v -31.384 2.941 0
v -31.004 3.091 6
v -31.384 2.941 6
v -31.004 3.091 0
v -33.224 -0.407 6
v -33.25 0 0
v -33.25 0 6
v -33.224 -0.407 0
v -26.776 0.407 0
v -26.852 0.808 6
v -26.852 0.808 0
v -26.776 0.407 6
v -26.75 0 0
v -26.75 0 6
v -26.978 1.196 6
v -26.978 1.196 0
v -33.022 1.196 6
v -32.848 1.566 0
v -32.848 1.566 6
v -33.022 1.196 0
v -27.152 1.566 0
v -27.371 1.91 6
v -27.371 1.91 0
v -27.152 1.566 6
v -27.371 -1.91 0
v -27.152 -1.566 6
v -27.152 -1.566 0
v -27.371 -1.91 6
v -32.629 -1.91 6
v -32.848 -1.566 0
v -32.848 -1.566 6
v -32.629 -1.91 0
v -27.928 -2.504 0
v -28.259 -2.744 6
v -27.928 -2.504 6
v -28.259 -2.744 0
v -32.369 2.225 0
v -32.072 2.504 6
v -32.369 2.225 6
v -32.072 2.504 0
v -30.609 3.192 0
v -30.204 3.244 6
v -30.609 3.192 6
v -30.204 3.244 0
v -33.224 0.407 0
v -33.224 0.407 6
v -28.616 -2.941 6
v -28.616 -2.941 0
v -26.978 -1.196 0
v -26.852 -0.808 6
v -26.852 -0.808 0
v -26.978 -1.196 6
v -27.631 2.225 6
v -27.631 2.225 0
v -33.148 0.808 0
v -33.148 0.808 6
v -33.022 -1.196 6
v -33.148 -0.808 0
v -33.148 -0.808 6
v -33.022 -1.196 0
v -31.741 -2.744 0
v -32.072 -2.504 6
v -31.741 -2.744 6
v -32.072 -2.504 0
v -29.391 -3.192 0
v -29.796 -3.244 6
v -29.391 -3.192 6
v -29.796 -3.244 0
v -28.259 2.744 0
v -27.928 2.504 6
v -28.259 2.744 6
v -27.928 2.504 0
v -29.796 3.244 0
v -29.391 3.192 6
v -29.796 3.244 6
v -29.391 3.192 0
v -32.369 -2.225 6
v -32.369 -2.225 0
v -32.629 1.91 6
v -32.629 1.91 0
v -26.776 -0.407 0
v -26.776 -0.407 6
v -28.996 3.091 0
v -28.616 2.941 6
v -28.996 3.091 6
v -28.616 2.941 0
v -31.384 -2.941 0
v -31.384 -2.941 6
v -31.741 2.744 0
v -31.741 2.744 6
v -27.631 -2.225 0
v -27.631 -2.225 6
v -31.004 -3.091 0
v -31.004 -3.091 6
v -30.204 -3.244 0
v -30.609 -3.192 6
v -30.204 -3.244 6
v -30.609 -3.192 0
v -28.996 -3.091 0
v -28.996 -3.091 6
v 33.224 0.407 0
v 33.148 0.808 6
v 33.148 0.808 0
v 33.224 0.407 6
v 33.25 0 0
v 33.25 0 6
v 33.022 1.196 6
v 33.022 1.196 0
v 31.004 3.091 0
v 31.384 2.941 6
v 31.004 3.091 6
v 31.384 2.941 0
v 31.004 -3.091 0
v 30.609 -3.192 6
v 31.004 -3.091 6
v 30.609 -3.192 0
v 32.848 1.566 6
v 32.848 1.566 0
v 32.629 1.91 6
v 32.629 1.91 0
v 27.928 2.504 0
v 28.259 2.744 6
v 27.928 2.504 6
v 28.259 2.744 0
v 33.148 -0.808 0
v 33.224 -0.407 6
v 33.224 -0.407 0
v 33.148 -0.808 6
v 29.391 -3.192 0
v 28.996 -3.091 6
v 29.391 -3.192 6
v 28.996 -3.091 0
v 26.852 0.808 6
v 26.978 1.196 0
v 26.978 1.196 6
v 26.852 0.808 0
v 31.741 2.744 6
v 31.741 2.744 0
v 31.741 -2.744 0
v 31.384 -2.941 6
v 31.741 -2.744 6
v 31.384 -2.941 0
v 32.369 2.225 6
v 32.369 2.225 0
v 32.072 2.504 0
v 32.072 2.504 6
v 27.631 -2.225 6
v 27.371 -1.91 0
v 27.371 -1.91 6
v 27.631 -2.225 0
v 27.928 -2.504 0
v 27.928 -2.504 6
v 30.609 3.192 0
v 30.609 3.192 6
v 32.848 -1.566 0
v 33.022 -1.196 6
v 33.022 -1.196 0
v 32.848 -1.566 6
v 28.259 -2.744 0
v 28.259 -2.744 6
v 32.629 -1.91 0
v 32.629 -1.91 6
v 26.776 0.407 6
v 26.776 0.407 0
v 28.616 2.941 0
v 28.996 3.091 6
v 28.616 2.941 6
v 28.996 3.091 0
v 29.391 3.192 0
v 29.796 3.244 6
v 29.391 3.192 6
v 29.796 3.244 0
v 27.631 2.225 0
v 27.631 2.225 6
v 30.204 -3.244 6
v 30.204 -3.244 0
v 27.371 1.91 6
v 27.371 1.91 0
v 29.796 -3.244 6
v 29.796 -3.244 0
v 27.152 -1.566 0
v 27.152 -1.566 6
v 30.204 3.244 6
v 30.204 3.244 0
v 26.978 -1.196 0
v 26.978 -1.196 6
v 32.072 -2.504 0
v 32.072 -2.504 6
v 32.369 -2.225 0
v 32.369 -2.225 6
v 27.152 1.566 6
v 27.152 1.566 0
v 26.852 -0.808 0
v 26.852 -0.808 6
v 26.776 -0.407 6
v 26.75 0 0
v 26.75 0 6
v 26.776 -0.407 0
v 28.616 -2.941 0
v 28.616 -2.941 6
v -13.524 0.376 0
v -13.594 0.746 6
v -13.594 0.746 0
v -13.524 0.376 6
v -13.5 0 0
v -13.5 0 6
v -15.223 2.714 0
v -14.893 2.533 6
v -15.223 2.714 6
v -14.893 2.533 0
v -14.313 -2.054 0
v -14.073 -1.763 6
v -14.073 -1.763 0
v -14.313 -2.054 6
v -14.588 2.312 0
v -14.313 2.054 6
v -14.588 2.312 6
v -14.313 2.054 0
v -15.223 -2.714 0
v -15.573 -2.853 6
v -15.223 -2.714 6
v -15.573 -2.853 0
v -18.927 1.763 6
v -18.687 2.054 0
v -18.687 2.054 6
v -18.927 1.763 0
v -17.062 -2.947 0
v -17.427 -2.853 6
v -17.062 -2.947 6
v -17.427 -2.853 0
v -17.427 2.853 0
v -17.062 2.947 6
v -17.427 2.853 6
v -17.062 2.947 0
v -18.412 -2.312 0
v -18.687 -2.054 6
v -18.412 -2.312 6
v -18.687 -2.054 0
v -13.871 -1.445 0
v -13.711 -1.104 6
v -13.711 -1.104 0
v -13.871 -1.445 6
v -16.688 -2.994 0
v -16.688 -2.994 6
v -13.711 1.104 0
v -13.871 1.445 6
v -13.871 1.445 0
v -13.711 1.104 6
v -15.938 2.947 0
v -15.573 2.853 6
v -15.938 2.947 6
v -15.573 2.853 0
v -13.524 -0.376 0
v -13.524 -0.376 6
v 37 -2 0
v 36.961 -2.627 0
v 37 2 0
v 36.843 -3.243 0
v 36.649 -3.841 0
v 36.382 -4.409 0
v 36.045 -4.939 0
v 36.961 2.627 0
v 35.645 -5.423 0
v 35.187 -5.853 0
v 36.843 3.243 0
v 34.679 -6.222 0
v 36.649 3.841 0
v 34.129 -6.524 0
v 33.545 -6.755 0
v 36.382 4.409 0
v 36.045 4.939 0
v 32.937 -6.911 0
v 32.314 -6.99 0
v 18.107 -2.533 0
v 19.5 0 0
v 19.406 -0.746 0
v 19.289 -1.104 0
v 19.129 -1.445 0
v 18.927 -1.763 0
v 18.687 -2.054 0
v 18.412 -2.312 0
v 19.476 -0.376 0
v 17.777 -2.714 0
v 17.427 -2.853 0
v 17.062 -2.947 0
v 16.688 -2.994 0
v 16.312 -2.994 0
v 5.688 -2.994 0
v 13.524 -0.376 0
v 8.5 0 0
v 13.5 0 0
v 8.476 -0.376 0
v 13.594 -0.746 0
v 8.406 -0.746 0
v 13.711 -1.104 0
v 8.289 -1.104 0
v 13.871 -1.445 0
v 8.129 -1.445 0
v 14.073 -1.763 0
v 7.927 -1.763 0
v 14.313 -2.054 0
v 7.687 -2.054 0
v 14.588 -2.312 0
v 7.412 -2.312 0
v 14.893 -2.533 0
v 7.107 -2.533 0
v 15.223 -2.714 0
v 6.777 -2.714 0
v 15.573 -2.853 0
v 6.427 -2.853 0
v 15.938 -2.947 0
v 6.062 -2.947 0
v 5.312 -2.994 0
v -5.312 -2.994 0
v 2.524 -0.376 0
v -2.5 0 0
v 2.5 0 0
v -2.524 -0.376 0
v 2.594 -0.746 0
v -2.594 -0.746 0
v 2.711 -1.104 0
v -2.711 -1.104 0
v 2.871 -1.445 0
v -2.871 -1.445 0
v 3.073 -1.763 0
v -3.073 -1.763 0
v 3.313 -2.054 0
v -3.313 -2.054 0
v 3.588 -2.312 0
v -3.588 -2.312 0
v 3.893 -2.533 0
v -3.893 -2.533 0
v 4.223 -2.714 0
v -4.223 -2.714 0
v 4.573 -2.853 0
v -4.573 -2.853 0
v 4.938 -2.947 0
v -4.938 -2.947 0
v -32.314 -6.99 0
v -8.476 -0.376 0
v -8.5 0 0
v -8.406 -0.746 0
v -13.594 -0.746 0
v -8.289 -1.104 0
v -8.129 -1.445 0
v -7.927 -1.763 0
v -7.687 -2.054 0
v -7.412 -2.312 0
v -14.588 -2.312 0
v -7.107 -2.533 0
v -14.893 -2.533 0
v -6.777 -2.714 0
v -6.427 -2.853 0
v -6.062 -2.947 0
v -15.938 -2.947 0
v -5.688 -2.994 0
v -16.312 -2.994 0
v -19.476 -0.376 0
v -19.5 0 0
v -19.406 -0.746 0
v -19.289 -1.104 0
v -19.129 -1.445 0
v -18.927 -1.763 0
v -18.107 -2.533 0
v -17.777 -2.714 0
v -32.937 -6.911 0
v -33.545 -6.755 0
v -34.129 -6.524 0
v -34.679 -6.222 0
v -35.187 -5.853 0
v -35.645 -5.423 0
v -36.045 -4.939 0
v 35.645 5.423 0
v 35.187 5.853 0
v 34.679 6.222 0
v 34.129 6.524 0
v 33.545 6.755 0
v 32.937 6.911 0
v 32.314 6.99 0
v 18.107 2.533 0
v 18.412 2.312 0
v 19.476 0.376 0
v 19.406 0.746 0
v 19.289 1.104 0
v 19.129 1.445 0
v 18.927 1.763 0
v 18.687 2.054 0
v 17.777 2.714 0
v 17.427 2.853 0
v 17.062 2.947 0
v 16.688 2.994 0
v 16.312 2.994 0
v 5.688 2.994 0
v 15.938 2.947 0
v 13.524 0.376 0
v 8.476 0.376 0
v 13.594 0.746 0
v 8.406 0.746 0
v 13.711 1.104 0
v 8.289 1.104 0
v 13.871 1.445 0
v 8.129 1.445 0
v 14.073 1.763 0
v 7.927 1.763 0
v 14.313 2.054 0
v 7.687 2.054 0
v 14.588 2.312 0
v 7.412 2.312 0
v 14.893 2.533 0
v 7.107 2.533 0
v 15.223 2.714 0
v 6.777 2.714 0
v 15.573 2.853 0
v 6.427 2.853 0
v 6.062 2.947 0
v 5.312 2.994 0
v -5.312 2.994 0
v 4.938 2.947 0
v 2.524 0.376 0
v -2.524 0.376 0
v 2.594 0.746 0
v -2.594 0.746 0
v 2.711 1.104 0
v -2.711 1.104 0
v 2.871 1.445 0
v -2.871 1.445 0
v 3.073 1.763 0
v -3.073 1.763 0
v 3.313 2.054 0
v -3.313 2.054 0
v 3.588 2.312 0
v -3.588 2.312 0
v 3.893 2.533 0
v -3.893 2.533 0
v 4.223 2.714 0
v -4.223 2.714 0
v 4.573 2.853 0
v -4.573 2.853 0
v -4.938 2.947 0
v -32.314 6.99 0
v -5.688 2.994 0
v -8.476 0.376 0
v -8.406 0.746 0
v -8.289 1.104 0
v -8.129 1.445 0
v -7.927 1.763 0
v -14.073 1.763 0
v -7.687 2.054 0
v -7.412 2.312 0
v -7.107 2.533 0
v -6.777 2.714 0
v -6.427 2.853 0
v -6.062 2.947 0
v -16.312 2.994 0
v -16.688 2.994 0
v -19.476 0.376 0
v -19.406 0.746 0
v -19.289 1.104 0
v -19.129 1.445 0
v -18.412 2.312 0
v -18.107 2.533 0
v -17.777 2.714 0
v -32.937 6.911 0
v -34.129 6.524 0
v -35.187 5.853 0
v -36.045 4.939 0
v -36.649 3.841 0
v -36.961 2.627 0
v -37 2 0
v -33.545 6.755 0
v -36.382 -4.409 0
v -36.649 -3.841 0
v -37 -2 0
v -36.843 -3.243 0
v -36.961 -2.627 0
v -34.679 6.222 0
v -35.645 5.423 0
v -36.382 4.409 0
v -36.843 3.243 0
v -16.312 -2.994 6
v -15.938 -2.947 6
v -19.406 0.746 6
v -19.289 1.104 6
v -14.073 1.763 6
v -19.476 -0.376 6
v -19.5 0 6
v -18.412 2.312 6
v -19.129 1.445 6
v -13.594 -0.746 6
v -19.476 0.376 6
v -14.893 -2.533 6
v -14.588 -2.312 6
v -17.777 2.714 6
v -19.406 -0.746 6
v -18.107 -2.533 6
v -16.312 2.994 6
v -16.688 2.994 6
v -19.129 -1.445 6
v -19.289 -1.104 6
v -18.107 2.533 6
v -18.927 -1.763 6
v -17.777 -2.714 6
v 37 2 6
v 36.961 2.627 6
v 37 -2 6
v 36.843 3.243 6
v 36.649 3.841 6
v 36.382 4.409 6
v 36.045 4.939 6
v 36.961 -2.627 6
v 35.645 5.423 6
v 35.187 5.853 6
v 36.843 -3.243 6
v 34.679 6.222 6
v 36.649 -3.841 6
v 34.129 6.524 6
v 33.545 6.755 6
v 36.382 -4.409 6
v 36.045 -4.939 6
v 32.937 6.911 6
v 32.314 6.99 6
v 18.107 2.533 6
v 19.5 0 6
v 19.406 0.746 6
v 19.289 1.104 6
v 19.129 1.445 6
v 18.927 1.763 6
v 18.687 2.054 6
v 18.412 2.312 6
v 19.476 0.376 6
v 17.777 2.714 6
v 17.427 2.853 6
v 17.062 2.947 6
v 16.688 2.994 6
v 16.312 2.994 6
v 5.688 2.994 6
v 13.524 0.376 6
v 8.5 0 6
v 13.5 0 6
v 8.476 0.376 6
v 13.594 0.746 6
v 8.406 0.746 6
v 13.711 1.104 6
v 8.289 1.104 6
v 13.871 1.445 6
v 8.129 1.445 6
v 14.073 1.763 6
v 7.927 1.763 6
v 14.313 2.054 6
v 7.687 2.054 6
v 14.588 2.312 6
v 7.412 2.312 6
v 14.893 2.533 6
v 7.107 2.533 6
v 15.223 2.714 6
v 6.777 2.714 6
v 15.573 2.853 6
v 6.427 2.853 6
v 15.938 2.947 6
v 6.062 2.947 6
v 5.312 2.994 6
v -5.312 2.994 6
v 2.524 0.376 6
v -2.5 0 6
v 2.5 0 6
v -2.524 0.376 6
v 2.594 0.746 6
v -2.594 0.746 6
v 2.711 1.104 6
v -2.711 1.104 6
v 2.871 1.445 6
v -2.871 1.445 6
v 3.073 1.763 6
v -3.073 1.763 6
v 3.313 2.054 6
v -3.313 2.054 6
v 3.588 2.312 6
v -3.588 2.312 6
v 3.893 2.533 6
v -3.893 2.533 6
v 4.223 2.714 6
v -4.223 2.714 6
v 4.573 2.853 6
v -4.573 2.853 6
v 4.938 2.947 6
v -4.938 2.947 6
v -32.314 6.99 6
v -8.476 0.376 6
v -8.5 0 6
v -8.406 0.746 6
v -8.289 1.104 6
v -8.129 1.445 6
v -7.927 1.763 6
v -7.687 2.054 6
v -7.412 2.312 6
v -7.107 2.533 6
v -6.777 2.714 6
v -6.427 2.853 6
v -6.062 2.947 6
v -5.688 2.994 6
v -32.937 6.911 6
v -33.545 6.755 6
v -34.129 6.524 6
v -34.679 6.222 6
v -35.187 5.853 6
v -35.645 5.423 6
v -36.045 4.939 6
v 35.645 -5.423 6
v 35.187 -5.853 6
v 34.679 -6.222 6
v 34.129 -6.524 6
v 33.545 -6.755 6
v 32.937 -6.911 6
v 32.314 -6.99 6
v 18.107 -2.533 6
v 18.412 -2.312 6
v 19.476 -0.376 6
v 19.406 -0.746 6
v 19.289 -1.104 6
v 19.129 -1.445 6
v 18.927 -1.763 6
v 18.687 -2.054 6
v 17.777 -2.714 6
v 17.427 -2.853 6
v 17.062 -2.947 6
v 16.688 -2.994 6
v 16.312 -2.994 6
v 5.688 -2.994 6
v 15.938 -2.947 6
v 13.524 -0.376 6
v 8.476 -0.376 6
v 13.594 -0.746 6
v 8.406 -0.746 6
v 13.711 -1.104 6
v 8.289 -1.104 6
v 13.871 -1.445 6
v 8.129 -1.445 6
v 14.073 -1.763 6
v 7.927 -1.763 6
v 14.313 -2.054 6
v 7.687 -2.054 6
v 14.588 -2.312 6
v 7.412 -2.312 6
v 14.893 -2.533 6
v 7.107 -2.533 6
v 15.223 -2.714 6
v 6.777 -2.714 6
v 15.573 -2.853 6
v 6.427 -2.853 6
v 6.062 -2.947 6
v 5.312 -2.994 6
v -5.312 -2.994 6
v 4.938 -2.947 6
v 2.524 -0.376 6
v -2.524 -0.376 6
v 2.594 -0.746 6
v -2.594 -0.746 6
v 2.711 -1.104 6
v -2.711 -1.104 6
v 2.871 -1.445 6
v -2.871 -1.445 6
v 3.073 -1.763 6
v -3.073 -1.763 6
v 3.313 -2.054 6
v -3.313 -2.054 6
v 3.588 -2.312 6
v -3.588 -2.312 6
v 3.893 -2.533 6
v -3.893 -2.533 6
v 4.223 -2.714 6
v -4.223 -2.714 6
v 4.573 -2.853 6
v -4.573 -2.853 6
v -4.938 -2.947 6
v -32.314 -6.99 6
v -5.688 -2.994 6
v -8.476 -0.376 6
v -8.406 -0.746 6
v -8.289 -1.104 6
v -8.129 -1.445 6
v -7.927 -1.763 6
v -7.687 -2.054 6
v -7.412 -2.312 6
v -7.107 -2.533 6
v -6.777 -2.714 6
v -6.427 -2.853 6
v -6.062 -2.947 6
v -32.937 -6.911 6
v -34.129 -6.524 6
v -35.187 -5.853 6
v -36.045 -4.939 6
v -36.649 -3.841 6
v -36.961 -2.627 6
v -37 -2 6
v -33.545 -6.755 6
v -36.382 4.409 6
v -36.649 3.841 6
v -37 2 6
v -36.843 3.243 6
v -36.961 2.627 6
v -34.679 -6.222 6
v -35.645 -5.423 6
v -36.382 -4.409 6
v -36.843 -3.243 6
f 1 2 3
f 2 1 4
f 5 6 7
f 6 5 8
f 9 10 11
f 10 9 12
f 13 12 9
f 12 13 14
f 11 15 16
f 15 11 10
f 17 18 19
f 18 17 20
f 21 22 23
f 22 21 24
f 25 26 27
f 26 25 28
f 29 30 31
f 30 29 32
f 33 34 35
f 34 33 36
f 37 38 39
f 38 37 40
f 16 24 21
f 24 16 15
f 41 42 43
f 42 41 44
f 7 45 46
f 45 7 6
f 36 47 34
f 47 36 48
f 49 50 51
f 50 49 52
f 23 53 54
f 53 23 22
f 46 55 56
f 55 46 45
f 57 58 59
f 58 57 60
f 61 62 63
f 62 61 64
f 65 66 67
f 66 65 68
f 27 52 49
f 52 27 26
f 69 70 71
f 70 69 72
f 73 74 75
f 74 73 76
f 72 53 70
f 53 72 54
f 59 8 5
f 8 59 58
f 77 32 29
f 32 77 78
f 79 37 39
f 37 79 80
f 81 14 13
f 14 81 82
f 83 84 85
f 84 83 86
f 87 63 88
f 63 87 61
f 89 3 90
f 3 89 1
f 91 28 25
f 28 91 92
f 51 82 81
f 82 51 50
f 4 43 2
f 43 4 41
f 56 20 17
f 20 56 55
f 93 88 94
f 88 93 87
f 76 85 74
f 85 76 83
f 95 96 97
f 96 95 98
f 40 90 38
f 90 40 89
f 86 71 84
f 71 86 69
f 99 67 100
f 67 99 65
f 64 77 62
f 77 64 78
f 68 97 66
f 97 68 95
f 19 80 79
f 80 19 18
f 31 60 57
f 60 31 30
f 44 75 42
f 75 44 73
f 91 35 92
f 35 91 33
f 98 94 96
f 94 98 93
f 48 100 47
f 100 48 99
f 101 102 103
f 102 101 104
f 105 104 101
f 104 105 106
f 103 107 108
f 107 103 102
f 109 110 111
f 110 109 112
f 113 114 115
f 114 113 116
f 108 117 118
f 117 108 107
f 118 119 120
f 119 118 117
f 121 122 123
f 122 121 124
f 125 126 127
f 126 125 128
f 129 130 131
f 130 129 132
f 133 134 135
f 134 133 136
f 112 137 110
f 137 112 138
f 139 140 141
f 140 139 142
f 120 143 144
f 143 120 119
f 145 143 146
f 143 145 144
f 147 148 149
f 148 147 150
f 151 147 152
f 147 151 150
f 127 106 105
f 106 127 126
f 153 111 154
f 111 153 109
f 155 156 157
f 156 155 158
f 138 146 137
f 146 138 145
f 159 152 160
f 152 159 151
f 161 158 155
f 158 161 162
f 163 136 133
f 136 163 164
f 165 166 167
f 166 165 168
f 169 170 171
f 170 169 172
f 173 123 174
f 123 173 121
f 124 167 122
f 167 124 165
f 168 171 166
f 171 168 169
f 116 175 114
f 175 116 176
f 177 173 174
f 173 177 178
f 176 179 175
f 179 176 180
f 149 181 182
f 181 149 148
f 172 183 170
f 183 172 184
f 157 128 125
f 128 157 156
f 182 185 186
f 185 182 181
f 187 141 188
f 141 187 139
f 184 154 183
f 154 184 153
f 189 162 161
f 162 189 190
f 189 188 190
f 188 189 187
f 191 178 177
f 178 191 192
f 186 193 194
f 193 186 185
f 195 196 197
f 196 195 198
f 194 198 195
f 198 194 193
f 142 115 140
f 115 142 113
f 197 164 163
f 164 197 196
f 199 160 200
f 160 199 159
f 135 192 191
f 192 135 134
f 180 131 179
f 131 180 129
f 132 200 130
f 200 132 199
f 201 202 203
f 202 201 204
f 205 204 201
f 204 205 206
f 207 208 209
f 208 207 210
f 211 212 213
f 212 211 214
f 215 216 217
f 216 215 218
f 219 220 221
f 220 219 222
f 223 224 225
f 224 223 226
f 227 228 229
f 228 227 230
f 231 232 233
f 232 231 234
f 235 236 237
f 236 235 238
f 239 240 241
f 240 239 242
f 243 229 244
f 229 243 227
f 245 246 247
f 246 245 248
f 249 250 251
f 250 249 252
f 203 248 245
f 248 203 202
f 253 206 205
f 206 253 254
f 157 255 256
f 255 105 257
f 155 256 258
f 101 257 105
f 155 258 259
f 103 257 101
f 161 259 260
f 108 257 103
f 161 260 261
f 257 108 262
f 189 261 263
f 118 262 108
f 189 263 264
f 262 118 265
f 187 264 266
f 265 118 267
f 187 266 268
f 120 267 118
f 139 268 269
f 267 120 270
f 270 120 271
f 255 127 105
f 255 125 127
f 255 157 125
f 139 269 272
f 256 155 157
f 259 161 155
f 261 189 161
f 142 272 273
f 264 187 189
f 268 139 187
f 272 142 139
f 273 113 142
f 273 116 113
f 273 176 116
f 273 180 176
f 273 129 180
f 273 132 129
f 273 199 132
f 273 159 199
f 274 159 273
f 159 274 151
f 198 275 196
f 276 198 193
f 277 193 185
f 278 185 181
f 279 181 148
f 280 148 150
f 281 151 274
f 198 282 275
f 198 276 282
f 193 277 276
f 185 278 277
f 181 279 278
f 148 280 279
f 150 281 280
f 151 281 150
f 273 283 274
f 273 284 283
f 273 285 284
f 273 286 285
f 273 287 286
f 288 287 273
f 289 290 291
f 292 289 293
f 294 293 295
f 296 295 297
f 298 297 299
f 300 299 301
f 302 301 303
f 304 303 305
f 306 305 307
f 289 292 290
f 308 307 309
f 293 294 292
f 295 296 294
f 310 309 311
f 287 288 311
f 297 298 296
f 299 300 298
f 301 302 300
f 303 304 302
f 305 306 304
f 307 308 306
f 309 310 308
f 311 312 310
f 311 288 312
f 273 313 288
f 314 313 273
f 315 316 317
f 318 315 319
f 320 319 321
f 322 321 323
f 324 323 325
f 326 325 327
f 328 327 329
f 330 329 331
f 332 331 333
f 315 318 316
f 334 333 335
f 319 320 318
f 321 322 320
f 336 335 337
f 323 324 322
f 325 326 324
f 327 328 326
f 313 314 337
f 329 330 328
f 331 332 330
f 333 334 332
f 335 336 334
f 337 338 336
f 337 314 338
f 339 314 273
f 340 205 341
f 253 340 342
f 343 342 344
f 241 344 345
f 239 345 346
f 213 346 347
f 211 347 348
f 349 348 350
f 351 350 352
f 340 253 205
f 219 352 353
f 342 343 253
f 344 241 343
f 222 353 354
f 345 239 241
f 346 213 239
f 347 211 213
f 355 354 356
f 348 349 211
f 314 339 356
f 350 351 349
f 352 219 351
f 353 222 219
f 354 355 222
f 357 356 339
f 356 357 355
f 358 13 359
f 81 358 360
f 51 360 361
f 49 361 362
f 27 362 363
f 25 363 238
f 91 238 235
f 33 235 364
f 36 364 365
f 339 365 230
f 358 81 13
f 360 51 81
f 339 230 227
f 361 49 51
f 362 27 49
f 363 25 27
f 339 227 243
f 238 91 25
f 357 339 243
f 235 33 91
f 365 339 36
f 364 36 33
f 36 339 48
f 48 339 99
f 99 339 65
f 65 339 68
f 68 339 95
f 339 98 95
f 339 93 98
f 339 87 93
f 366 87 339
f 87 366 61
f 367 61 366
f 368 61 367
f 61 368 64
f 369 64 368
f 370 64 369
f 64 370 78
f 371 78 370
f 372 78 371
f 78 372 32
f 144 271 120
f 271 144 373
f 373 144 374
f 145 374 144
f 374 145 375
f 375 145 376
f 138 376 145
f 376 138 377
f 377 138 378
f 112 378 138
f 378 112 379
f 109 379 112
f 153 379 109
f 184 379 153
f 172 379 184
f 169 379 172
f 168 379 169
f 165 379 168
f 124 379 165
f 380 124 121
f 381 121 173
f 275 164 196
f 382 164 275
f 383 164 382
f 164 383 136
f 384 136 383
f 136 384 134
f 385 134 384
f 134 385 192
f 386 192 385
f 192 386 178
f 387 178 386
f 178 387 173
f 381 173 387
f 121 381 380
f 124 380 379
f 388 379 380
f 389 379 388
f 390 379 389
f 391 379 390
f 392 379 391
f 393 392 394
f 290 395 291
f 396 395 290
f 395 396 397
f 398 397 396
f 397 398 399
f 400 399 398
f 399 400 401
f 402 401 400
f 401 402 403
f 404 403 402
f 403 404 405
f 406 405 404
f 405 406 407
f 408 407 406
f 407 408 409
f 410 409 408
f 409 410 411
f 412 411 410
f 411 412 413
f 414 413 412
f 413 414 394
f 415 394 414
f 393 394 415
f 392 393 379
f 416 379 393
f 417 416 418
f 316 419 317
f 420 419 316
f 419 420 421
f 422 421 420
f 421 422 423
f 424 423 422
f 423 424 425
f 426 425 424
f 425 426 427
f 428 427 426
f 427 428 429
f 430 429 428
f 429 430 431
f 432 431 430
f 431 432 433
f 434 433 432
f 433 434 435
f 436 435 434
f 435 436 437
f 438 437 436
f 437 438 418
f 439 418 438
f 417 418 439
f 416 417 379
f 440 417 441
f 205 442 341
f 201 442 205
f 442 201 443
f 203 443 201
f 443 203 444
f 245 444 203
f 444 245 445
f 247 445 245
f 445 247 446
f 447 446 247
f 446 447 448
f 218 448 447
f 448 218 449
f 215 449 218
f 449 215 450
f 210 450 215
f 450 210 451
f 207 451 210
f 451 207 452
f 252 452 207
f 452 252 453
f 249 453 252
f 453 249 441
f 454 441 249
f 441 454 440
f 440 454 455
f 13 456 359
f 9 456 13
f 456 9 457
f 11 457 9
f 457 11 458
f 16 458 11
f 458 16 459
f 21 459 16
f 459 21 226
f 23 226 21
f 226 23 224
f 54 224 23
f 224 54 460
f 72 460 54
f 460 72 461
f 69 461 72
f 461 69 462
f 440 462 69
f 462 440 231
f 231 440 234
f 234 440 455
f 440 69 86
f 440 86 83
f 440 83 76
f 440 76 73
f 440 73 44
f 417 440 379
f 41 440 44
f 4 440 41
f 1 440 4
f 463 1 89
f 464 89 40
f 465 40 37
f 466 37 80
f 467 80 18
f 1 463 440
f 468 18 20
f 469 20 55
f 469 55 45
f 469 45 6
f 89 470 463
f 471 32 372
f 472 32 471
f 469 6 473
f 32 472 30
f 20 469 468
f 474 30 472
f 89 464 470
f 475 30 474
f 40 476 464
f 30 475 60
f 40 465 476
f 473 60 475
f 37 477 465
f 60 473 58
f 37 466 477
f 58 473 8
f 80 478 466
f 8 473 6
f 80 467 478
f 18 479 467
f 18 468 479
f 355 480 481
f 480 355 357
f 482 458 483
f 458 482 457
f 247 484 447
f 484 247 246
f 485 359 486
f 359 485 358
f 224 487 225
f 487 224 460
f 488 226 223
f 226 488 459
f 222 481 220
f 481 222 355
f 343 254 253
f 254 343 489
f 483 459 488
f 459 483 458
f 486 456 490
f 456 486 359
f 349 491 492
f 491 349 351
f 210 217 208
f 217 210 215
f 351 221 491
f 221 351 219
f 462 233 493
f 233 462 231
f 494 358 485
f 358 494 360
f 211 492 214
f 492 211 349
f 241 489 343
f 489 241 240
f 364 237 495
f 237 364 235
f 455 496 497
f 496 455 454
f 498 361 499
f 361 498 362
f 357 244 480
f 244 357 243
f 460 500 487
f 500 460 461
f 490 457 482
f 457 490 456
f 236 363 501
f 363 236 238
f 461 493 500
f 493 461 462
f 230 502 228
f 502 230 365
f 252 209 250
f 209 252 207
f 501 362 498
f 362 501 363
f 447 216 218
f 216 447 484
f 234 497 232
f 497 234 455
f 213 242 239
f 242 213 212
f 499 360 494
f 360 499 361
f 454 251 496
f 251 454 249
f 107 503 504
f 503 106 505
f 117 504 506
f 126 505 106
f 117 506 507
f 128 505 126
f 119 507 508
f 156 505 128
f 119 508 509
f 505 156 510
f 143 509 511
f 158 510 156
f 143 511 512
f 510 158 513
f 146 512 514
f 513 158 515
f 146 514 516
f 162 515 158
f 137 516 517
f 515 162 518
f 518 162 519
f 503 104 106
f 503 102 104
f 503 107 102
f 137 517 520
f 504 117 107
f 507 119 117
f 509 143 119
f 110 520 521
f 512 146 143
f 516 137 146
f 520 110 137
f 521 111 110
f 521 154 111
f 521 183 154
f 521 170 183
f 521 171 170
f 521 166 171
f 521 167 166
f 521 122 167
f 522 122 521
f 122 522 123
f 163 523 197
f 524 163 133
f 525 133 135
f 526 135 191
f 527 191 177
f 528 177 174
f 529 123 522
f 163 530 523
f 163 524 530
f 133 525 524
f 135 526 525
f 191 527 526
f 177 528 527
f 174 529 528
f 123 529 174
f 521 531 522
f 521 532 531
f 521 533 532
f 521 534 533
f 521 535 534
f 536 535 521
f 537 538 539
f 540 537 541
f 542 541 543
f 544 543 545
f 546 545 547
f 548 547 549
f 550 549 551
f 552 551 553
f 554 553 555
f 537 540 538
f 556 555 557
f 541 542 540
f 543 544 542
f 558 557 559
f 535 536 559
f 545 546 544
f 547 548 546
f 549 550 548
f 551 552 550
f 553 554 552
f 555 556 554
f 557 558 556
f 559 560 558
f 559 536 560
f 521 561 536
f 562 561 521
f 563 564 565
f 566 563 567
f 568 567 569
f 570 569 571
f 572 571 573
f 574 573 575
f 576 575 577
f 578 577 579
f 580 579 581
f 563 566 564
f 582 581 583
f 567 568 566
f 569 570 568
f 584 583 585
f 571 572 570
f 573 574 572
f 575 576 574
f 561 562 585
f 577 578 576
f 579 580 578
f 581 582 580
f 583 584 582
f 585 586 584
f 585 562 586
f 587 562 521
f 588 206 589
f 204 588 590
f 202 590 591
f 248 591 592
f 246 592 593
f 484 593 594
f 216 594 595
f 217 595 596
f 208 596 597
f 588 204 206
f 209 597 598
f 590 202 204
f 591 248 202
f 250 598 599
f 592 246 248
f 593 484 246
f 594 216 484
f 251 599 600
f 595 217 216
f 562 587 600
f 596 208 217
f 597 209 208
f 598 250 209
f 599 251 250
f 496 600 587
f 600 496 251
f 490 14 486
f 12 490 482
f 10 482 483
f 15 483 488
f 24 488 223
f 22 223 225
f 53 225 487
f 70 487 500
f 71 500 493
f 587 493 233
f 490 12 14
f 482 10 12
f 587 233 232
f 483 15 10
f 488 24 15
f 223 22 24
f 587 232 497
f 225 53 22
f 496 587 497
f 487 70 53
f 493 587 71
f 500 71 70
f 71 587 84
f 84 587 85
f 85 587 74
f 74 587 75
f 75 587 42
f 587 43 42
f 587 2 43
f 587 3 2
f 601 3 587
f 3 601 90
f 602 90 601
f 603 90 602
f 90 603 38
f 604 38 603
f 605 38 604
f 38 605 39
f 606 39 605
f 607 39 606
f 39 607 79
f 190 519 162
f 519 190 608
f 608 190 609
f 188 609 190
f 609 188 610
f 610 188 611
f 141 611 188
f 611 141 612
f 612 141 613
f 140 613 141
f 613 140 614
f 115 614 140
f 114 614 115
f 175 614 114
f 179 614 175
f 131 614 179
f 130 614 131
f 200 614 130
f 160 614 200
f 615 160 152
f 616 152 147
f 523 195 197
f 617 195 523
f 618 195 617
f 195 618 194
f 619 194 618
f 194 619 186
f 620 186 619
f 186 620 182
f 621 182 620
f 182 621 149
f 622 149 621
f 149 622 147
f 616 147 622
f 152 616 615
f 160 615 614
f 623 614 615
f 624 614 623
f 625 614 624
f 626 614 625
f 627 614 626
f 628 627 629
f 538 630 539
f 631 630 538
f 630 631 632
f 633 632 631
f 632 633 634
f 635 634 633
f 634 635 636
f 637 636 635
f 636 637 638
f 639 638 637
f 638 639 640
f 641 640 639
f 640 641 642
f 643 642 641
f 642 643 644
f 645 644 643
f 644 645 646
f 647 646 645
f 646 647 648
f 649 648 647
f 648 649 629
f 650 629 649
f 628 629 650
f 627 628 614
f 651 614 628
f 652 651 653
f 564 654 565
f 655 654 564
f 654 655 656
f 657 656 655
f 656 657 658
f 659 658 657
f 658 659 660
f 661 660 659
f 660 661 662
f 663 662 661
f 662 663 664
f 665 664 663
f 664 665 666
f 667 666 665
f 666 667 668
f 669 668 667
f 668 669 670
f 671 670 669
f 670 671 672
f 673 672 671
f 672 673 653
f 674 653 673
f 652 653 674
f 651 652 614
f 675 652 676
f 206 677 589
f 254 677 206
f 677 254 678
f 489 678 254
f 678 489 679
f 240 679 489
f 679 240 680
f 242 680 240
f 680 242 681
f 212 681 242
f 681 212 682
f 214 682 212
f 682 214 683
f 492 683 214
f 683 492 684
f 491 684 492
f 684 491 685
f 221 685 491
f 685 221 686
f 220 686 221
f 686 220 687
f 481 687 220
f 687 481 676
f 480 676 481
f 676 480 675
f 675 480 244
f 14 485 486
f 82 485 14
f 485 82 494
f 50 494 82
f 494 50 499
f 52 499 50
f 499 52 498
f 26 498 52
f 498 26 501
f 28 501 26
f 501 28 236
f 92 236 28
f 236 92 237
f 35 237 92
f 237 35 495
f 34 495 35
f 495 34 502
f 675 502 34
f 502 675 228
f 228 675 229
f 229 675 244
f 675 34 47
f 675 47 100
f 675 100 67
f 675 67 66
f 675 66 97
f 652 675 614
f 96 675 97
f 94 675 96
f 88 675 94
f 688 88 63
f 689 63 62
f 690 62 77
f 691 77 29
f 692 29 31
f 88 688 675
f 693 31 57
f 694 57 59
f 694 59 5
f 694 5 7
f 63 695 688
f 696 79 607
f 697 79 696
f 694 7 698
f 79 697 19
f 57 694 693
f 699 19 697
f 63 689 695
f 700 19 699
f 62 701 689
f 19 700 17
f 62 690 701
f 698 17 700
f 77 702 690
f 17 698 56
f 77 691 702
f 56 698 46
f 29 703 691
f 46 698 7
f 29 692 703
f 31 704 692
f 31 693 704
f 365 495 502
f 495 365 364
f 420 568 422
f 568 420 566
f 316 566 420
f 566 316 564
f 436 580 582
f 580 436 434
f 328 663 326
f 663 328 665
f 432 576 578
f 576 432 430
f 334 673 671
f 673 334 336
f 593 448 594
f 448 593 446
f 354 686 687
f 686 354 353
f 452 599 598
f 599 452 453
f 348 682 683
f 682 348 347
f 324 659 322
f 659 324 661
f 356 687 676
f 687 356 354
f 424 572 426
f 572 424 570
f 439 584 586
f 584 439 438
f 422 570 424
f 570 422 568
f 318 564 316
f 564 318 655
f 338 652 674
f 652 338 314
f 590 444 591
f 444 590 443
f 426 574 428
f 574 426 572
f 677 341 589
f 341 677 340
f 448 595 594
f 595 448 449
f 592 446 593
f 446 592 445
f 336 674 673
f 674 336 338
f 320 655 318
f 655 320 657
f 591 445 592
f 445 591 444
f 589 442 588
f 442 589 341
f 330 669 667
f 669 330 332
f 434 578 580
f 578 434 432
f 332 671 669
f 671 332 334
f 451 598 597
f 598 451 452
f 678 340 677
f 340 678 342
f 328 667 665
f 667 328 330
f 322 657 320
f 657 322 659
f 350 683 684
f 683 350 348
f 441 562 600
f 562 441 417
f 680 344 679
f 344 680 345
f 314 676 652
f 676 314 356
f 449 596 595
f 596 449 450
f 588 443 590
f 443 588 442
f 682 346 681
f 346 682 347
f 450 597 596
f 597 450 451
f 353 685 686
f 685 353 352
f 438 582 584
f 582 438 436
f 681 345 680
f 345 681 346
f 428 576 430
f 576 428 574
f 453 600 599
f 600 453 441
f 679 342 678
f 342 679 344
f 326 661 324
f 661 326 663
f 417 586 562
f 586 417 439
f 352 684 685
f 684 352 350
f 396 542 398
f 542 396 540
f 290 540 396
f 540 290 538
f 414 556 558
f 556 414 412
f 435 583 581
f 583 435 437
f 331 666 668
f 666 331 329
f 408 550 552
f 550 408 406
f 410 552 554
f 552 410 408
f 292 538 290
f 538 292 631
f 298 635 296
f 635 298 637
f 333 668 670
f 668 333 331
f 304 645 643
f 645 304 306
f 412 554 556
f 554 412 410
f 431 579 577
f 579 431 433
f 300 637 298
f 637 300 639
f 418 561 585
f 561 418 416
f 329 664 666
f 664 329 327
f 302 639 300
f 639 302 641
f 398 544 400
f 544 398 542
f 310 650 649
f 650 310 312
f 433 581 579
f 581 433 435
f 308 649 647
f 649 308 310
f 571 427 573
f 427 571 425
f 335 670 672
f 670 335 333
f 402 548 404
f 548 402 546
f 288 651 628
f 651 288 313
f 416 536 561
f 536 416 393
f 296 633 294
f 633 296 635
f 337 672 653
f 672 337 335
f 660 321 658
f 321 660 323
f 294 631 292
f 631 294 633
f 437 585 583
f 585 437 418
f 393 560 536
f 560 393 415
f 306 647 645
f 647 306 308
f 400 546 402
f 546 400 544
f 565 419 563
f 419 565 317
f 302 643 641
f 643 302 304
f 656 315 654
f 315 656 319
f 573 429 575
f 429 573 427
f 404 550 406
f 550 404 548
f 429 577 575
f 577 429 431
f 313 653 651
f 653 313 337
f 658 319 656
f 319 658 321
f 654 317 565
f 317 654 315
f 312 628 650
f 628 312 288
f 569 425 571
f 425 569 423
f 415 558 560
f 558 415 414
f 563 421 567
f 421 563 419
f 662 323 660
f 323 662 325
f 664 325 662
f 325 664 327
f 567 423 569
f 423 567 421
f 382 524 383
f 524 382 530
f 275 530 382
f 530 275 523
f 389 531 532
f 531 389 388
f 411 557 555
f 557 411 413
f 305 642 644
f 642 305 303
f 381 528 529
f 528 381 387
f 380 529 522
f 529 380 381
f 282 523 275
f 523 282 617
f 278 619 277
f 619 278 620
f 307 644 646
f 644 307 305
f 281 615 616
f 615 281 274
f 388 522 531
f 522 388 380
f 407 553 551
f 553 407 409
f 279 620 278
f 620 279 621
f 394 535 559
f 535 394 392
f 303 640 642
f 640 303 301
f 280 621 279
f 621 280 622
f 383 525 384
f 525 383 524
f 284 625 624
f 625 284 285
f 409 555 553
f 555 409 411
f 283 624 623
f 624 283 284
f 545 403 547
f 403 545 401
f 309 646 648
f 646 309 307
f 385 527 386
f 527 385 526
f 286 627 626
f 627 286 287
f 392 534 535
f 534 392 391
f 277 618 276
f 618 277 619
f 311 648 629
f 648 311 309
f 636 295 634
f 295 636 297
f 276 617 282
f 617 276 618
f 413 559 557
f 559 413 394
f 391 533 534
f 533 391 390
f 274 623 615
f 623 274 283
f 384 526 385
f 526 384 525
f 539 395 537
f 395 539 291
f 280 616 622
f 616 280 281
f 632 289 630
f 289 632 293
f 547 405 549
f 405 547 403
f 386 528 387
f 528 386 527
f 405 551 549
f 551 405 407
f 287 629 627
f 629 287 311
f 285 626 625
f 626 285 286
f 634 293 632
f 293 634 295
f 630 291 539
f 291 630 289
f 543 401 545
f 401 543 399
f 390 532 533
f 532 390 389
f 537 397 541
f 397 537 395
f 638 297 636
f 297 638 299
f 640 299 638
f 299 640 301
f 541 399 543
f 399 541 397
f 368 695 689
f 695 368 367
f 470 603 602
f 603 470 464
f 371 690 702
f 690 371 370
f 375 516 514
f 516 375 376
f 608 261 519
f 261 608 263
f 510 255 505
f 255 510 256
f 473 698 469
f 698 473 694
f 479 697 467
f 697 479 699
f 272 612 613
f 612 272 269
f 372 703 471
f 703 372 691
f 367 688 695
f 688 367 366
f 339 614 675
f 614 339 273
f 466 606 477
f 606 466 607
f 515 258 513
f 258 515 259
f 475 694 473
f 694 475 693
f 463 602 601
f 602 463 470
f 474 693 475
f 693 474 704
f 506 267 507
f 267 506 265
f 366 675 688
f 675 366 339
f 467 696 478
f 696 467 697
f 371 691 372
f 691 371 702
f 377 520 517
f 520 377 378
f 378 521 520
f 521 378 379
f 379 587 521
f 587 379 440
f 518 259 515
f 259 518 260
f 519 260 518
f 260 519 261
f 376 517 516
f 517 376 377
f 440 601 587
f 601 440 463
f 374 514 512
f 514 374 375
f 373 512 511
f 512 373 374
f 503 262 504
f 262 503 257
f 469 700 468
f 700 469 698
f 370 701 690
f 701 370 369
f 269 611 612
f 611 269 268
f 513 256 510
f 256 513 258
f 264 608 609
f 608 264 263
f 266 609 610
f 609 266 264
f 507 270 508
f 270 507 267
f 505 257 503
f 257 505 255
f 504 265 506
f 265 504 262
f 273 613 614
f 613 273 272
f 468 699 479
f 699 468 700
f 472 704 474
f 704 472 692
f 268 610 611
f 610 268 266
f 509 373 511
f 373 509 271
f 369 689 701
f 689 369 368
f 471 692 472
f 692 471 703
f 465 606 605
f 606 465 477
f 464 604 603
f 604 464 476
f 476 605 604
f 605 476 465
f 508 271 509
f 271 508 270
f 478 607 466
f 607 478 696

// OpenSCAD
$fn = 50;


difference() {
	union() {
		hull() {
			translate(v = [-32.0000000000, 2.0000000000, 0]) {
				cylinder(h = 6, r = 5);
			}
			translate(v = [32.0000000000, 2.0000000000, 0]) {
				cylinder(h = 6, r = 5);
			}
			translate(v = [-32.0000000000, -2.0000000000, 0]) {
				cylinder(h = 6, r = 5);
			}
			translate(v = [32.0000000000, -2.0000000000, 0]) {
				cylinder(h = 6, r = 5);
			}
		}
	}
	union() {
		#translate(v = [-30.0000000000, 0.0000000000, 0]) {
			cylinder(h = 6, r = 3.2500000000);
		}
		#translate(v = [30.0000000000, 0.0000000000, 0]) {
			cylinder(h = 6, r = 3.2500000000);
		}
		#translate(v = [-30.0000000000, 0.0000000000, -100.0000000000]) {
			cylinder(h = 200, r = 3.2500000000);
		}
		#translate(v = [-30.0000000000, 0.0000000000, -100.0000000000]) {
			cylinder(h = 200, r = 3.2500000000);
		}
		#translate(v = [30.0000000000, 0.0000000000, -100.0000000000]) {
			cylinder(h = 200, r = 3.2500000000);
		}
		#translate(v = [30.0000000000, 0.0000000000, -100.0000000000]) {
			cylinder(h = 200, r = 3.2500000000);
		}
		#translate(v = [-30.0000000000, 0.0000000000, 0]) {
			cylinder(h = 6, r = 1.8000000000);
		}
		#translate(v = [30.0000000000, 0.0000000000, 0]) {
			cylinder(h = 6, r = 1.8000000000);
		}
		#translate(v = [-30.0000000000, 0.0000000000, 0]) {
			cylinder(h = 6, r = 1.8000000000);
		}
		#translate(v = [30.0000000000, 0.0000000000, 0]) {
			cylinder(h = 6, r = 1.8000000000);
		}
		#translate(v = [-30.0000000000, 0.0000000000, 0]) {
			cylinder(h = 6, r = 1.8000000000);
		}
		#translate(v = [30.0000000000, 0.0000000000, 0]) {
			cylinder(h = 6, r = 1.8000000000);
		}
		#translate(v = [-16.5000000000, 0, 0]) {
			cylinder(h = 6, r = 3.0000000000);
		}
		#translate(v = [-5.5000000000, 0, 0]) {
			cylinder(h = 6, r = 3.0000000000);
		}
		#translate(v = [5.5000000000, 0, 0]) {
			cylinder(h = 6, r = 3.0000000000);
		}
		#translate(v = [16.5000000000, 0, 0]) {
			cylinder(h = 6, r = 3.0000000000);
		}
	}
}
